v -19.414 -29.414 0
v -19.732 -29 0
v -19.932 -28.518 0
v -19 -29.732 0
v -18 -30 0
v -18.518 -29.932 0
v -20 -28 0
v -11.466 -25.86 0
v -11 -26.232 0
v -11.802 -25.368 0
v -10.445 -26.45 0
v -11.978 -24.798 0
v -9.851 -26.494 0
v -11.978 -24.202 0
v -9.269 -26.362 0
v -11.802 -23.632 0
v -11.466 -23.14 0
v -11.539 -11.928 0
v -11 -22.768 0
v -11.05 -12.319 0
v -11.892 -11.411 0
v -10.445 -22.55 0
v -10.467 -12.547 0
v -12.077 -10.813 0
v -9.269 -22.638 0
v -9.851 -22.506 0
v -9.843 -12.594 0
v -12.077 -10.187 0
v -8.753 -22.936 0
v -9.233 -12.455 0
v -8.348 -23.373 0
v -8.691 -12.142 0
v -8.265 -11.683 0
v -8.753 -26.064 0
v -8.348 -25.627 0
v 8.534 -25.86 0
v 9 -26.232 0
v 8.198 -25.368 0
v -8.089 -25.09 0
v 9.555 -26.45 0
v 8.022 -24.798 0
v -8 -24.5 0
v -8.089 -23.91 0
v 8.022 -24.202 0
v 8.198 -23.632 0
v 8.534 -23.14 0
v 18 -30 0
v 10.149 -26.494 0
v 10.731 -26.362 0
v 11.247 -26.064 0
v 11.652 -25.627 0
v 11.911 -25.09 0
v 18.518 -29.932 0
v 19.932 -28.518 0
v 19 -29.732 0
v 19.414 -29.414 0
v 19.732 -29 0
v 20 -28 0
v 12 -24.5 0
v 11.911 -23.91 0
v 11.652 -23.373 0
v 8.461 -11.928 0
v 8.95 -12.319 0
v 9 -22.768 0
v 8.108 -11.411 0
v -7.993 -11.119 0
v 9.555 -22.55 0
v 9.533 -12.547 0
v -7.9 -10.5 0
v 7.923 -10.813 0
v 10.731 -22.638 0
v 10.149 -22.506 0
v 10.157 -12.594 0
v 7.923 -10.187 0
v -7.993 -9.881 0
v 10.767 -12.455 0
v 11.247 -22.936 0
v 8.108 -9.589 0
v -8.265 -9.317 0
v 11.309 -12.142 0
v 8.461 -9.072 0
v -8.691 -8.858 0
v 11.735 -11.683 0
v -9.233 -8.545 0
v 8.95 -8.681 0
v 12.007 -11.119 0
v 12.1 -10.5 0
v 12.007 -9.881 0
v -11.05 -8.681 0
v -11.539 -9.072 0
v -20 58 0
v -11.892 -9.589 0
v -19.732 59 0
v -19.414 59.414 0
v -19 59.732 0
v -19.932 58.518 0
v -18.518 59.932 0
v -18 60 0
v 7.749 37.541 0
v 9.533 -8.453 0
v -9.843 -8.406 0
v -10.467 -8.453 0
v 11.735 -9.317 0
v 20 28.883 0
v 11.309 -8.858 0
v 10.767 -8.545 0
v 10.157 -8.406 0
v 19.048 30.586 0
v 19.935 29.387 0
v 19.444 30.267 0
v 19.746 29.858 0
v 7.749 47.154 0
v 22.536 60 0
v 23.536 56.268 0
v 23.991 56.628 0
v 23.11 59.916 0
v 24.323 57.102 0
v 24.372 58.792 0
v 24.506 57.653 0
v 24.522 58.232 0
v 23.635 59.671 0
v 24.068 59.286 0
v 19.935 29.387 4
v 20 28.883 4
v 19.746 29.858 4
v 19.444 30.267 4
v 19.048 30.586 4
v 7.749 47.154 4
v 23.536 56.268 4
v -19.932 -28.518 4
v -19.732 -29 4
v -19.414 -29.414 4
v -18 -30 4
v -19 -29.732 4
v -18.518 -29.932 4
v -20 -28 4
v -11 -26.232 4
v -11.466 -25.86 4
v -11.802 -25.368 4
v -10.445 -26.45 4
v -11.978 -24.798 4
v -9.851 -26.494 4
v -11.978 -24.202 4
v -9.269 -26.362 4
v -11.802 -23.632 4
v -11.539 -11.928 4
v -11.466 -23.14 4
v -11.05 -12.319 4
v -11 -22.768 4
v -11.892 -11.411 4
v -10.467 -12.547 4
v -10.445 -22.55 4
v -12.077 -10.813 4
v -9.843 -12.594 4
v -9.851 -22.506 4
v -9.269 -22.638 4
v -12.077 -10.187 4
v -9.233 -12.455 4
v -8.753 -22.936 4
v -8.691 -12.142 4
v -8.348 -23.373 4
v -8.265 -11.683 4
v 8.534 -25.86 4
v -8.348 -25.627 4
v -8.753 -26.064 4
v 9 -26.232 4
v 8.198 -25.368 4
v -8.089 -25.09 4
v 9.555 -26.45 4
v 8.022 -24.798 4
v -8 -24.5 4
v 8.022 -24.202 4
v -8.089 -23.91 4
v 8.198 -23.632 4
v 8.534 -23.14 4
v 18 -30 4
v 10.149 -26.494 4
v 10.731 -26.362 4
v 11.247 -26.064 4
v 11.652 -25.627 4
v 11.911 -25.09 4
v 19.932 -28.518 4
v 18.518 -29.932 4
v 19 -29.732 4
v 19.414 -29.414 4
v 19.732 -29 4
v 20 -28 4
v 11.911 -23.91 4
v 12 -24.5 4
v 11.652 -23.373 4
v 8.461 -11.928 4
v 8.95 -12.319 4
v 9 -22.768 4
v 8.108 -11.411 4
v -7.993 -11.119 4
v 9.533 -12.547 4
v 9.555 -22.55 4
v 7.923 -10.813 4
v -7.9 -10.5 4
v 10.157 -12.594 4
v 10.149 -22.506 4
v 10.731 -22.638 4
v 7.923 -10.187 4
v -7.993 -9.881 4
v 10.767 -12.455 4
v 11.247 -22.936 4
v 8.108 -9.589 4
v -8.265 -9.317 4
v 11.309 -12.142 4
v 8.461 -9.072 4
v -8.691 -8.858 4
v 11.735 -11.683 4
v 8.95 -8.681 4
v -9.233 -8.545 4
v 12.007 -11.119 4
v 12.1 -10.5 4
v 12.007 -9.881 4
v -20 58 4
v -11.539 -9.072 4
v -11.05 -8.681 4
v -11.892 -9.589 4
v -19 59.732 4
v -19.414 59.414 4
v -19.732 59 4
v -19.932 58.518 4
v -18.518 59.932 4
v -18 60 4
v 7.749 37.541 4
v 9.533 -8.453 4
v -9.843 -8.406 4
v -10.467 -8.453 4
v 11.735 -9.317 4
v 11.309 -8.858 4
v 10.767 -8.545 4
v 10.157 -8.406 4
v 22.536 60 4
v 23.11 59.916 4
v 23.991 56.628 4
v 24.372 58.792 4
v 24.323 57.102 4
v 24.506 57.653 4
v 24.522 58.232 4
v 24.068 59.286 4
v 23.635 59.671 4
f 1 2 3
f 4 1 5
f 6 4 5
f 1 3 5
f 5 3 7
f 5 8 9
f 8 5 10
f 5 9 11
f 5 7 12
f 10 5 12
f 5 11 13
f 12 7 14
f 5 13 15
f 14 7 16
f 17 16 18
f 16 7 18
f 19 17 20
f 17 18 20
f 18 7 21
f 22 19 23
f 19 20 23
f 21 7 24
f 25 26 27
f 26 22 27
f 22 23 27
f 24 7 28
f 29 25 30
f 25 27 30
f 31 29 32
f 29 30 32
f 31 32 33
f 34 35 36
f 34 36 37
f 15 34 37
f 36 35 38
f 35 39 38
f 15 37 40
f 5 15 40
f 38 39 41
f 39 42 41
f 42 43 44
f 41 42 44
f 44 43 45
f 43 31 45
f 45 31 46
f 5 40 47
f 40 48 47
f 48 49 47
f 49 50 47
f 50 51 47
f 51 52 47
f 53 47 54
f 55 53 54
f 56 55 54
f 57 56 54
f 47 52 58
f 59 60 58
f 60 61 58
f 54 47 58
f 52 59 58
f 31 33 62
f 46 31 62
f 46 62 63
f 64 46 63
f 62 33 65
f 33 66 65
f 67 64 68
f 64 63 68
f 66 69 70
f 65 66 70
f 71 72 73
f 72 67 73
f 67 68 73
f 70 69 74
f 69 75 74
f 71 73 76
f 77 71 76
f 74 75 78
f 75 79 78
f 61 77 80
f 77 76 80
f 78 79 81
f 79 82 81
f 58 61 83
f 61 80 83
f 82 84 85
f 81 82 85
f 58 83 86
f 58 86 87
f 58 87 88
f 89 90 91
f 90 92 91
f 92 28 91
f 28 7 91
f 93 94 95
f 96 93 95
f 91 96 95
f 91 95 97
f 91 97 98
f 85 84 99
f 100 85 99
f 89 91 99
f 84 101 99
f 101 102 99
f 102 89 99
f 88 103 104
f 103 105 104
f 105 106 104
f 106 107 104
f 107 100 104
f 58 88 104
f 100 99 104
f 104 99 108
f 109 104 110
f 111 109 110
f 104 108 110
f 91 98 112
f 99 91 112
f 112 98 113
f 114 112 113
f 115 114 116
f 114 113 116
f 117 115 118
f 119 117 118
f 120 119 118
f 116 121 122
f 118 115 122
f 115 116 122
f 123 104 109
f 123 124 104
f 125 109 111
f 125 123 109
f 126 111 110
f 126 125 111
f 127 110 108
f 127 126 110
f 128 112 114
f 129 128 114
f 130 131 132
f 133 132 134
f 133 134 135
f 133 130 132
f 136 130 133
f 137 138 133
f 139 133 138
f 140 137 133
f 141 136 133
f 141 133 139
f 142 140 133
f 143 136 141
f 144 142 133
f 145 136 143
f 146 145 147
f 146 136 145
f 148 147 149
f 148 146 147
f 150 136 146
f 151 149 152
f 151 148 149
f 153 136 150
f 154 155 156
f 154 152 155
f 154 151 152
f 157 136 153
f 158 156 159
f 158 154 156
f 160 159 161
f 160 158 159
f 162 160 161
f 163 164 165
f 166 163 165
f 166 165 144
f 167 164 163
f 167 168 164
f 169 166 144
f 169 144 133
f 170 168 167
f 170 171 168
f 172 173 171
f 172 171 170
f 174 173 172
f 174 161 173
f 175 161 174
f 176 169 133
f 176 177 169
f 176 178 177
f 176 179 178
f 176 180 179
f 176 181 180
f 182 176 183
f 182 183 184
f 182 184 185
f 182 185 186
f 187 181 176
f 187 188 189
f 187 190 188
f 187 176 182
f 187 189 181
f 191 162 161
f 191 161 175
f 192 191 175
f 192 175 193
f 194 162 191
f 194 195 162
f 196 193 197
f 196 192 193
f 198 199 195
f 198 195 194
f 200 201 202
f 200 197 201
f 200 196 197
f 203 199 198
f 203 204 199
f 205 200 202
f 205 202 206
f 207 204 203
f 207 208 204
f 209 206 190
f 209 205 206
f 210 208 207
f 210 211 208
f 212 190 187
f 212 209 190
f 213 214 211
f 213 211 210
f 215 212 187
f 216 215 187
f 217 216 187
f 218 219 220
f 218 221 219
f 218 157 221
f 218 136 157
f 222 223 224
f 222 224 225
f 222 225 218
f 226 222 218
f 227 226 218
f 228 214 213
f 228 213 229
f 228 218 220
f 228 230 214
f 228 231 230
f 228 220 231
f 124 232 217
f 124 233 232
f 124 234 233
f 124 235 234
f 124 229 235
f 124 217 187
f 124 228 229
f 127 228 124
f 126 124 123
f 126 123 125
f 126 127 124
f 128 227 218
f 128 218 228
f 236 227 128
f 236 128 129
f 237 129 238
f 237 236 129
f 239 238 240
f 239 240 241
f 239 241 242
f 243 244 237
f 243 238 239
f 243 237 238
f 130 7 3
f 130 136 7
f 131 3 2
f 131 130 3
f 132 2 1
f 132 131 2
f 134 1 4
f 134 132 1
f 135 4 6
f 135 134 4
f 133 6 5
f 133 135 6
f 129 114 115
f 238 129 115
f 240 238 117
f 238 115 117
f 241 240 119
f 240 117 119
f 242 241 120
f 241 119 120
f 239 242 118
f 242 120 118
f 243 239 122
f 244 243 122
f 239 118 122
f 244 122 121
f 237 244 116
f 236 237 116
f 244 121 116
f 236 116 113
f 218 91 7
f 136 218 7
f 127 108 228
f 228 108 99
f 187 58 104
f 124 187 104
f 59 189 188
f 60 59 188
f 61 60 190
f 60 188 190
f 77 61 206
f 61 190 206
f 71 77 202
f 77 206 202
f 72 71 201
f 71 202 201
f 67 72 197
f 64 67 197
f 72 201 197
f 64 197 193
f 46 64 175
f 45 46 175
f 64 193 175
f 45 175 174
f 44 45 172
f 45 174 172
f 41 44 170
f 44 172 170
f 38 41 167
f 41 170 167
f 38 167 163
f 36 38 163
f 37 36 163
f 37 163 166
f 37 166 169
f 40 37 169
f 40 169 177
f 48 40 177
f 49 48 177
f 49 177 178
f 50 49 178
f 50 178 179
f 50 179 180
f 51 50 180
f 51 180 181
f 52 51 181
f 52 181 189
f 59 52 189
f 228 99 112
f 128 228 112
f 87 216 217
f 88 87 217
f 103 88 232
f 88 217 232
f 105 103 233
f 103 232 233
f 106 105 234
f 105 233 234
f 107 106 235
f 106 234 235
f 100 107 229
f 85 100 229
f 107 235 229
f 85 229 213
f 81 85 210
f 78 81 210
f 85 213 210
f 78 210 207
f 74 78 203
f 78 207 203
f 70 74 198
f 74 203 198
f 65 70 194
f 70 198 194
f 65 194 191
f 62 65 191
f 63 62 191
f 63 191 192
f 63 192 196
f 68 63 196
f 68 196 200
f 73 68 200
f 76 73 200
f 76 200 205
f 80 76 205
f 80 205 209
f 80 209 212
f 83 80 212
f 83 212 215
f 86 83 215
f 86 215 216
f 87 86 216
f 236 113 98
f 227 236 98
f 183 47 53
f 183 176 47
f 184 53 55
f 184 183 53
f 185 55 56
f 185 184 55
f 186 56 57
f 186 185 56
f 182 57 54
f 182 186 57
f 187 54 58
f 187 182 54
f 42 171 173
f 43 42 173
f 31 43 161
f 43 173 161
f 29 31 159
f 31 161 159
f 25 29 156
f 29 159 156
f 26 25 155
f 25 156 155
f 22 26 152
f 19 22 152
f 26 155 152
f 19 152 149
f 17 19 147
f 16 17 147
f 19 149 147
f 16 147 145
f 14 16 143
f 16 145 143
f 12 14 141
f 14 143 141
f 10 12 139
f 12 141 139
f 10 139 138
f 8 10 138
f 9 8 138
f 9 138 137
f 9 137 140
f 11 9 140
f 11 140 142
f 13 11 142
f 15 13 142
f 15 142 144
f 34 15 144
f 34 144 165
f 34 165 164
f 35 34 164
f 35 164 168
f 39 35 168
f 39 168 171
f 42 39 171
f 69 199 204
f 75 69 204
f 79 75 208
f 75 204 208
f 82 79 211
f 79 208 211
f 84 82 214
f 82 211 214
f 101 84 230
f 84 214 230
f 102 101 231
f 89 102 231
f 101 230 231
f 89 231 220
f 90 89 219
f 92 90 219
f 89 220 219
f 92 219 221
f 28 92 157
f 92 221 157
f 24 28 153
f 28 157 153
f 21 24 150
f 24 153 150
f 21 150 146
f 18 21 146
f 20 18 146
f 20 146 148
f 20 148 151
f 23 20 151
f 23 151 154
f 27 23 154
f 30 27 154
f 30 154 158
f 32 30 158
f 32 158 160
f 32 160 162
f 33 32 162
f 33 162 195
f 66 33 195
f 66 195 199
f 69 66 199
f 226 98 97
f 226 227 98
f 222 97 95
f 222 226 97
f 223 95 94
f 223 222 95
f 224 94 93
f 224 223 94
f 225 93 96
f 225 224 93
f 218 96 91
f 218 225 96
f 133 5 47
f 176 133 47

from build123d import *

# Parameters (mm, degrees)
EXTRUDE_1_DEPTH     = 4
CUT_EXTRUDE_1_REACH = 66.946
SKETCH_2_R          = 2
SKETCH_2_R_2        = 2.1
FILLET_1_R          = 2


with BuildPart() as part:
    # 草图1 → 凸台-拉伸1 (new body)
    with BuildSketch(Plane.XY):
        with BuildLine():
            Line((22.535898385, 60), (-20, 60))
            Line((-20, 60), (-20, 30))
            Line((-20, 30), (-20, -30))
            Line((-20, -30), (20, -30))
            Line((20, -30), (20, 30))
            Line((20, 30), (7.749348907, 37.54075723))
            Line((7.749348907, 37.54075723), (7.749348907, 47.153580602))
            Line((7.749348907, 47.153580602), (23.535898385, 56.267949192))
            ThreePointArc((23.535898385, 56.267949192), (24.467750037, 58.51763809), (22.535898385, 60))
        make_face()
    extrude(amount=EXTRUDE_1_DEPTH)

    # 草图2 → 切除-拉伸1 (cut, up to next)
    with BuildSketch(Plane.XY.offset(4), mode=Mode.PRIVATE) as cut_extrude_1_sk1:
        with Locations((-10, -24.5)):
            Circle(SKETCH_2_R)
    cut_extrude_1_tool1 = extrude(cut_extrude_1_sk1.sketch, amount=-CUT_EXTRUDE_1_REACH, mode=Mode.PRIVATE) & part.part
    # 草图2 → 切除-拉伸1 (cut, up to next)
    with BuildSketch(Plane.XY.offset(4), mode=Mode.PRIVATE) as cut_extrude_1_sk2:
        with Locations((-10, -10.5)):
            Circle(SKETCH_2_R_2)
    cut_extrude_1_tool2 = extrude(cut_extrude_1_sk2.sketch, amount=-CUT_EXTRUDE_1_REACH, mode=Mode.PRIVATE) & part.part
    # 草图2 → 切除-拉伸1 (cut, up to next)
    with BuildSketch(Plane.XY.offset(4), mode=Mode.PRIVATE) as cut_extrude_1_sk3:
        with Locations((10, -10.5)):
            Circle(SKETCH_2_R_2)
    cut_extrude_1_tool3 = extrude(cut_extrude_1_sk3.sketch, amount=-CUT_EXTRUDE_1_REACH, mode=Mode.PRIVATE) & part.part
    # 草图2 → 切除-拉伸1 (cut, up to next)
    with BuildSketch(Plane.XY.offset(4), mode=Mode.PRIVATE) as cut_extrude_1_sk4:
        with Locations((10, -24.5)):
            Circle(SKETCH_2_R)
    cut_extrude_1_tool4 = extrude(cut_extrude_1_sk4.sketch, amount=-CUT_EXTRUDE_1_REACH, mode=Mode.PRIVATE) & part.part
    add(cut_extrude_1_tool1.solids().sort_by_distance((-10, -24.5, 4))[0], mode=Mode.SUBTRACT)
    add(cut_extrude_1_tool2.solids().sort_by_distance((-10, -10.5, 4))[0], mode=Mode.SUBTRACT)
    add(cut_extrude_1_tool3.solids().sort_by_distance((10, -10.5, 4))[0], mode=Mode.SUBTRACT)
    add(cut_extrude_1_tool4.solids().sort_by_distance((10, -24.5, 4))[0], mode=Mode.SUBTRACT)

    # 圆角1
    fillet_1_edges = [part.edges().sort_by_distance(p)[0] for p in [
        (20, 30, 2),
        (20, -30, 2),
        (-20, -30, 2),
        (-20, 60, 2),
    ]]
    fillet(fillet_1_edges, radius=FILLET_1_R)


solid = part.part
